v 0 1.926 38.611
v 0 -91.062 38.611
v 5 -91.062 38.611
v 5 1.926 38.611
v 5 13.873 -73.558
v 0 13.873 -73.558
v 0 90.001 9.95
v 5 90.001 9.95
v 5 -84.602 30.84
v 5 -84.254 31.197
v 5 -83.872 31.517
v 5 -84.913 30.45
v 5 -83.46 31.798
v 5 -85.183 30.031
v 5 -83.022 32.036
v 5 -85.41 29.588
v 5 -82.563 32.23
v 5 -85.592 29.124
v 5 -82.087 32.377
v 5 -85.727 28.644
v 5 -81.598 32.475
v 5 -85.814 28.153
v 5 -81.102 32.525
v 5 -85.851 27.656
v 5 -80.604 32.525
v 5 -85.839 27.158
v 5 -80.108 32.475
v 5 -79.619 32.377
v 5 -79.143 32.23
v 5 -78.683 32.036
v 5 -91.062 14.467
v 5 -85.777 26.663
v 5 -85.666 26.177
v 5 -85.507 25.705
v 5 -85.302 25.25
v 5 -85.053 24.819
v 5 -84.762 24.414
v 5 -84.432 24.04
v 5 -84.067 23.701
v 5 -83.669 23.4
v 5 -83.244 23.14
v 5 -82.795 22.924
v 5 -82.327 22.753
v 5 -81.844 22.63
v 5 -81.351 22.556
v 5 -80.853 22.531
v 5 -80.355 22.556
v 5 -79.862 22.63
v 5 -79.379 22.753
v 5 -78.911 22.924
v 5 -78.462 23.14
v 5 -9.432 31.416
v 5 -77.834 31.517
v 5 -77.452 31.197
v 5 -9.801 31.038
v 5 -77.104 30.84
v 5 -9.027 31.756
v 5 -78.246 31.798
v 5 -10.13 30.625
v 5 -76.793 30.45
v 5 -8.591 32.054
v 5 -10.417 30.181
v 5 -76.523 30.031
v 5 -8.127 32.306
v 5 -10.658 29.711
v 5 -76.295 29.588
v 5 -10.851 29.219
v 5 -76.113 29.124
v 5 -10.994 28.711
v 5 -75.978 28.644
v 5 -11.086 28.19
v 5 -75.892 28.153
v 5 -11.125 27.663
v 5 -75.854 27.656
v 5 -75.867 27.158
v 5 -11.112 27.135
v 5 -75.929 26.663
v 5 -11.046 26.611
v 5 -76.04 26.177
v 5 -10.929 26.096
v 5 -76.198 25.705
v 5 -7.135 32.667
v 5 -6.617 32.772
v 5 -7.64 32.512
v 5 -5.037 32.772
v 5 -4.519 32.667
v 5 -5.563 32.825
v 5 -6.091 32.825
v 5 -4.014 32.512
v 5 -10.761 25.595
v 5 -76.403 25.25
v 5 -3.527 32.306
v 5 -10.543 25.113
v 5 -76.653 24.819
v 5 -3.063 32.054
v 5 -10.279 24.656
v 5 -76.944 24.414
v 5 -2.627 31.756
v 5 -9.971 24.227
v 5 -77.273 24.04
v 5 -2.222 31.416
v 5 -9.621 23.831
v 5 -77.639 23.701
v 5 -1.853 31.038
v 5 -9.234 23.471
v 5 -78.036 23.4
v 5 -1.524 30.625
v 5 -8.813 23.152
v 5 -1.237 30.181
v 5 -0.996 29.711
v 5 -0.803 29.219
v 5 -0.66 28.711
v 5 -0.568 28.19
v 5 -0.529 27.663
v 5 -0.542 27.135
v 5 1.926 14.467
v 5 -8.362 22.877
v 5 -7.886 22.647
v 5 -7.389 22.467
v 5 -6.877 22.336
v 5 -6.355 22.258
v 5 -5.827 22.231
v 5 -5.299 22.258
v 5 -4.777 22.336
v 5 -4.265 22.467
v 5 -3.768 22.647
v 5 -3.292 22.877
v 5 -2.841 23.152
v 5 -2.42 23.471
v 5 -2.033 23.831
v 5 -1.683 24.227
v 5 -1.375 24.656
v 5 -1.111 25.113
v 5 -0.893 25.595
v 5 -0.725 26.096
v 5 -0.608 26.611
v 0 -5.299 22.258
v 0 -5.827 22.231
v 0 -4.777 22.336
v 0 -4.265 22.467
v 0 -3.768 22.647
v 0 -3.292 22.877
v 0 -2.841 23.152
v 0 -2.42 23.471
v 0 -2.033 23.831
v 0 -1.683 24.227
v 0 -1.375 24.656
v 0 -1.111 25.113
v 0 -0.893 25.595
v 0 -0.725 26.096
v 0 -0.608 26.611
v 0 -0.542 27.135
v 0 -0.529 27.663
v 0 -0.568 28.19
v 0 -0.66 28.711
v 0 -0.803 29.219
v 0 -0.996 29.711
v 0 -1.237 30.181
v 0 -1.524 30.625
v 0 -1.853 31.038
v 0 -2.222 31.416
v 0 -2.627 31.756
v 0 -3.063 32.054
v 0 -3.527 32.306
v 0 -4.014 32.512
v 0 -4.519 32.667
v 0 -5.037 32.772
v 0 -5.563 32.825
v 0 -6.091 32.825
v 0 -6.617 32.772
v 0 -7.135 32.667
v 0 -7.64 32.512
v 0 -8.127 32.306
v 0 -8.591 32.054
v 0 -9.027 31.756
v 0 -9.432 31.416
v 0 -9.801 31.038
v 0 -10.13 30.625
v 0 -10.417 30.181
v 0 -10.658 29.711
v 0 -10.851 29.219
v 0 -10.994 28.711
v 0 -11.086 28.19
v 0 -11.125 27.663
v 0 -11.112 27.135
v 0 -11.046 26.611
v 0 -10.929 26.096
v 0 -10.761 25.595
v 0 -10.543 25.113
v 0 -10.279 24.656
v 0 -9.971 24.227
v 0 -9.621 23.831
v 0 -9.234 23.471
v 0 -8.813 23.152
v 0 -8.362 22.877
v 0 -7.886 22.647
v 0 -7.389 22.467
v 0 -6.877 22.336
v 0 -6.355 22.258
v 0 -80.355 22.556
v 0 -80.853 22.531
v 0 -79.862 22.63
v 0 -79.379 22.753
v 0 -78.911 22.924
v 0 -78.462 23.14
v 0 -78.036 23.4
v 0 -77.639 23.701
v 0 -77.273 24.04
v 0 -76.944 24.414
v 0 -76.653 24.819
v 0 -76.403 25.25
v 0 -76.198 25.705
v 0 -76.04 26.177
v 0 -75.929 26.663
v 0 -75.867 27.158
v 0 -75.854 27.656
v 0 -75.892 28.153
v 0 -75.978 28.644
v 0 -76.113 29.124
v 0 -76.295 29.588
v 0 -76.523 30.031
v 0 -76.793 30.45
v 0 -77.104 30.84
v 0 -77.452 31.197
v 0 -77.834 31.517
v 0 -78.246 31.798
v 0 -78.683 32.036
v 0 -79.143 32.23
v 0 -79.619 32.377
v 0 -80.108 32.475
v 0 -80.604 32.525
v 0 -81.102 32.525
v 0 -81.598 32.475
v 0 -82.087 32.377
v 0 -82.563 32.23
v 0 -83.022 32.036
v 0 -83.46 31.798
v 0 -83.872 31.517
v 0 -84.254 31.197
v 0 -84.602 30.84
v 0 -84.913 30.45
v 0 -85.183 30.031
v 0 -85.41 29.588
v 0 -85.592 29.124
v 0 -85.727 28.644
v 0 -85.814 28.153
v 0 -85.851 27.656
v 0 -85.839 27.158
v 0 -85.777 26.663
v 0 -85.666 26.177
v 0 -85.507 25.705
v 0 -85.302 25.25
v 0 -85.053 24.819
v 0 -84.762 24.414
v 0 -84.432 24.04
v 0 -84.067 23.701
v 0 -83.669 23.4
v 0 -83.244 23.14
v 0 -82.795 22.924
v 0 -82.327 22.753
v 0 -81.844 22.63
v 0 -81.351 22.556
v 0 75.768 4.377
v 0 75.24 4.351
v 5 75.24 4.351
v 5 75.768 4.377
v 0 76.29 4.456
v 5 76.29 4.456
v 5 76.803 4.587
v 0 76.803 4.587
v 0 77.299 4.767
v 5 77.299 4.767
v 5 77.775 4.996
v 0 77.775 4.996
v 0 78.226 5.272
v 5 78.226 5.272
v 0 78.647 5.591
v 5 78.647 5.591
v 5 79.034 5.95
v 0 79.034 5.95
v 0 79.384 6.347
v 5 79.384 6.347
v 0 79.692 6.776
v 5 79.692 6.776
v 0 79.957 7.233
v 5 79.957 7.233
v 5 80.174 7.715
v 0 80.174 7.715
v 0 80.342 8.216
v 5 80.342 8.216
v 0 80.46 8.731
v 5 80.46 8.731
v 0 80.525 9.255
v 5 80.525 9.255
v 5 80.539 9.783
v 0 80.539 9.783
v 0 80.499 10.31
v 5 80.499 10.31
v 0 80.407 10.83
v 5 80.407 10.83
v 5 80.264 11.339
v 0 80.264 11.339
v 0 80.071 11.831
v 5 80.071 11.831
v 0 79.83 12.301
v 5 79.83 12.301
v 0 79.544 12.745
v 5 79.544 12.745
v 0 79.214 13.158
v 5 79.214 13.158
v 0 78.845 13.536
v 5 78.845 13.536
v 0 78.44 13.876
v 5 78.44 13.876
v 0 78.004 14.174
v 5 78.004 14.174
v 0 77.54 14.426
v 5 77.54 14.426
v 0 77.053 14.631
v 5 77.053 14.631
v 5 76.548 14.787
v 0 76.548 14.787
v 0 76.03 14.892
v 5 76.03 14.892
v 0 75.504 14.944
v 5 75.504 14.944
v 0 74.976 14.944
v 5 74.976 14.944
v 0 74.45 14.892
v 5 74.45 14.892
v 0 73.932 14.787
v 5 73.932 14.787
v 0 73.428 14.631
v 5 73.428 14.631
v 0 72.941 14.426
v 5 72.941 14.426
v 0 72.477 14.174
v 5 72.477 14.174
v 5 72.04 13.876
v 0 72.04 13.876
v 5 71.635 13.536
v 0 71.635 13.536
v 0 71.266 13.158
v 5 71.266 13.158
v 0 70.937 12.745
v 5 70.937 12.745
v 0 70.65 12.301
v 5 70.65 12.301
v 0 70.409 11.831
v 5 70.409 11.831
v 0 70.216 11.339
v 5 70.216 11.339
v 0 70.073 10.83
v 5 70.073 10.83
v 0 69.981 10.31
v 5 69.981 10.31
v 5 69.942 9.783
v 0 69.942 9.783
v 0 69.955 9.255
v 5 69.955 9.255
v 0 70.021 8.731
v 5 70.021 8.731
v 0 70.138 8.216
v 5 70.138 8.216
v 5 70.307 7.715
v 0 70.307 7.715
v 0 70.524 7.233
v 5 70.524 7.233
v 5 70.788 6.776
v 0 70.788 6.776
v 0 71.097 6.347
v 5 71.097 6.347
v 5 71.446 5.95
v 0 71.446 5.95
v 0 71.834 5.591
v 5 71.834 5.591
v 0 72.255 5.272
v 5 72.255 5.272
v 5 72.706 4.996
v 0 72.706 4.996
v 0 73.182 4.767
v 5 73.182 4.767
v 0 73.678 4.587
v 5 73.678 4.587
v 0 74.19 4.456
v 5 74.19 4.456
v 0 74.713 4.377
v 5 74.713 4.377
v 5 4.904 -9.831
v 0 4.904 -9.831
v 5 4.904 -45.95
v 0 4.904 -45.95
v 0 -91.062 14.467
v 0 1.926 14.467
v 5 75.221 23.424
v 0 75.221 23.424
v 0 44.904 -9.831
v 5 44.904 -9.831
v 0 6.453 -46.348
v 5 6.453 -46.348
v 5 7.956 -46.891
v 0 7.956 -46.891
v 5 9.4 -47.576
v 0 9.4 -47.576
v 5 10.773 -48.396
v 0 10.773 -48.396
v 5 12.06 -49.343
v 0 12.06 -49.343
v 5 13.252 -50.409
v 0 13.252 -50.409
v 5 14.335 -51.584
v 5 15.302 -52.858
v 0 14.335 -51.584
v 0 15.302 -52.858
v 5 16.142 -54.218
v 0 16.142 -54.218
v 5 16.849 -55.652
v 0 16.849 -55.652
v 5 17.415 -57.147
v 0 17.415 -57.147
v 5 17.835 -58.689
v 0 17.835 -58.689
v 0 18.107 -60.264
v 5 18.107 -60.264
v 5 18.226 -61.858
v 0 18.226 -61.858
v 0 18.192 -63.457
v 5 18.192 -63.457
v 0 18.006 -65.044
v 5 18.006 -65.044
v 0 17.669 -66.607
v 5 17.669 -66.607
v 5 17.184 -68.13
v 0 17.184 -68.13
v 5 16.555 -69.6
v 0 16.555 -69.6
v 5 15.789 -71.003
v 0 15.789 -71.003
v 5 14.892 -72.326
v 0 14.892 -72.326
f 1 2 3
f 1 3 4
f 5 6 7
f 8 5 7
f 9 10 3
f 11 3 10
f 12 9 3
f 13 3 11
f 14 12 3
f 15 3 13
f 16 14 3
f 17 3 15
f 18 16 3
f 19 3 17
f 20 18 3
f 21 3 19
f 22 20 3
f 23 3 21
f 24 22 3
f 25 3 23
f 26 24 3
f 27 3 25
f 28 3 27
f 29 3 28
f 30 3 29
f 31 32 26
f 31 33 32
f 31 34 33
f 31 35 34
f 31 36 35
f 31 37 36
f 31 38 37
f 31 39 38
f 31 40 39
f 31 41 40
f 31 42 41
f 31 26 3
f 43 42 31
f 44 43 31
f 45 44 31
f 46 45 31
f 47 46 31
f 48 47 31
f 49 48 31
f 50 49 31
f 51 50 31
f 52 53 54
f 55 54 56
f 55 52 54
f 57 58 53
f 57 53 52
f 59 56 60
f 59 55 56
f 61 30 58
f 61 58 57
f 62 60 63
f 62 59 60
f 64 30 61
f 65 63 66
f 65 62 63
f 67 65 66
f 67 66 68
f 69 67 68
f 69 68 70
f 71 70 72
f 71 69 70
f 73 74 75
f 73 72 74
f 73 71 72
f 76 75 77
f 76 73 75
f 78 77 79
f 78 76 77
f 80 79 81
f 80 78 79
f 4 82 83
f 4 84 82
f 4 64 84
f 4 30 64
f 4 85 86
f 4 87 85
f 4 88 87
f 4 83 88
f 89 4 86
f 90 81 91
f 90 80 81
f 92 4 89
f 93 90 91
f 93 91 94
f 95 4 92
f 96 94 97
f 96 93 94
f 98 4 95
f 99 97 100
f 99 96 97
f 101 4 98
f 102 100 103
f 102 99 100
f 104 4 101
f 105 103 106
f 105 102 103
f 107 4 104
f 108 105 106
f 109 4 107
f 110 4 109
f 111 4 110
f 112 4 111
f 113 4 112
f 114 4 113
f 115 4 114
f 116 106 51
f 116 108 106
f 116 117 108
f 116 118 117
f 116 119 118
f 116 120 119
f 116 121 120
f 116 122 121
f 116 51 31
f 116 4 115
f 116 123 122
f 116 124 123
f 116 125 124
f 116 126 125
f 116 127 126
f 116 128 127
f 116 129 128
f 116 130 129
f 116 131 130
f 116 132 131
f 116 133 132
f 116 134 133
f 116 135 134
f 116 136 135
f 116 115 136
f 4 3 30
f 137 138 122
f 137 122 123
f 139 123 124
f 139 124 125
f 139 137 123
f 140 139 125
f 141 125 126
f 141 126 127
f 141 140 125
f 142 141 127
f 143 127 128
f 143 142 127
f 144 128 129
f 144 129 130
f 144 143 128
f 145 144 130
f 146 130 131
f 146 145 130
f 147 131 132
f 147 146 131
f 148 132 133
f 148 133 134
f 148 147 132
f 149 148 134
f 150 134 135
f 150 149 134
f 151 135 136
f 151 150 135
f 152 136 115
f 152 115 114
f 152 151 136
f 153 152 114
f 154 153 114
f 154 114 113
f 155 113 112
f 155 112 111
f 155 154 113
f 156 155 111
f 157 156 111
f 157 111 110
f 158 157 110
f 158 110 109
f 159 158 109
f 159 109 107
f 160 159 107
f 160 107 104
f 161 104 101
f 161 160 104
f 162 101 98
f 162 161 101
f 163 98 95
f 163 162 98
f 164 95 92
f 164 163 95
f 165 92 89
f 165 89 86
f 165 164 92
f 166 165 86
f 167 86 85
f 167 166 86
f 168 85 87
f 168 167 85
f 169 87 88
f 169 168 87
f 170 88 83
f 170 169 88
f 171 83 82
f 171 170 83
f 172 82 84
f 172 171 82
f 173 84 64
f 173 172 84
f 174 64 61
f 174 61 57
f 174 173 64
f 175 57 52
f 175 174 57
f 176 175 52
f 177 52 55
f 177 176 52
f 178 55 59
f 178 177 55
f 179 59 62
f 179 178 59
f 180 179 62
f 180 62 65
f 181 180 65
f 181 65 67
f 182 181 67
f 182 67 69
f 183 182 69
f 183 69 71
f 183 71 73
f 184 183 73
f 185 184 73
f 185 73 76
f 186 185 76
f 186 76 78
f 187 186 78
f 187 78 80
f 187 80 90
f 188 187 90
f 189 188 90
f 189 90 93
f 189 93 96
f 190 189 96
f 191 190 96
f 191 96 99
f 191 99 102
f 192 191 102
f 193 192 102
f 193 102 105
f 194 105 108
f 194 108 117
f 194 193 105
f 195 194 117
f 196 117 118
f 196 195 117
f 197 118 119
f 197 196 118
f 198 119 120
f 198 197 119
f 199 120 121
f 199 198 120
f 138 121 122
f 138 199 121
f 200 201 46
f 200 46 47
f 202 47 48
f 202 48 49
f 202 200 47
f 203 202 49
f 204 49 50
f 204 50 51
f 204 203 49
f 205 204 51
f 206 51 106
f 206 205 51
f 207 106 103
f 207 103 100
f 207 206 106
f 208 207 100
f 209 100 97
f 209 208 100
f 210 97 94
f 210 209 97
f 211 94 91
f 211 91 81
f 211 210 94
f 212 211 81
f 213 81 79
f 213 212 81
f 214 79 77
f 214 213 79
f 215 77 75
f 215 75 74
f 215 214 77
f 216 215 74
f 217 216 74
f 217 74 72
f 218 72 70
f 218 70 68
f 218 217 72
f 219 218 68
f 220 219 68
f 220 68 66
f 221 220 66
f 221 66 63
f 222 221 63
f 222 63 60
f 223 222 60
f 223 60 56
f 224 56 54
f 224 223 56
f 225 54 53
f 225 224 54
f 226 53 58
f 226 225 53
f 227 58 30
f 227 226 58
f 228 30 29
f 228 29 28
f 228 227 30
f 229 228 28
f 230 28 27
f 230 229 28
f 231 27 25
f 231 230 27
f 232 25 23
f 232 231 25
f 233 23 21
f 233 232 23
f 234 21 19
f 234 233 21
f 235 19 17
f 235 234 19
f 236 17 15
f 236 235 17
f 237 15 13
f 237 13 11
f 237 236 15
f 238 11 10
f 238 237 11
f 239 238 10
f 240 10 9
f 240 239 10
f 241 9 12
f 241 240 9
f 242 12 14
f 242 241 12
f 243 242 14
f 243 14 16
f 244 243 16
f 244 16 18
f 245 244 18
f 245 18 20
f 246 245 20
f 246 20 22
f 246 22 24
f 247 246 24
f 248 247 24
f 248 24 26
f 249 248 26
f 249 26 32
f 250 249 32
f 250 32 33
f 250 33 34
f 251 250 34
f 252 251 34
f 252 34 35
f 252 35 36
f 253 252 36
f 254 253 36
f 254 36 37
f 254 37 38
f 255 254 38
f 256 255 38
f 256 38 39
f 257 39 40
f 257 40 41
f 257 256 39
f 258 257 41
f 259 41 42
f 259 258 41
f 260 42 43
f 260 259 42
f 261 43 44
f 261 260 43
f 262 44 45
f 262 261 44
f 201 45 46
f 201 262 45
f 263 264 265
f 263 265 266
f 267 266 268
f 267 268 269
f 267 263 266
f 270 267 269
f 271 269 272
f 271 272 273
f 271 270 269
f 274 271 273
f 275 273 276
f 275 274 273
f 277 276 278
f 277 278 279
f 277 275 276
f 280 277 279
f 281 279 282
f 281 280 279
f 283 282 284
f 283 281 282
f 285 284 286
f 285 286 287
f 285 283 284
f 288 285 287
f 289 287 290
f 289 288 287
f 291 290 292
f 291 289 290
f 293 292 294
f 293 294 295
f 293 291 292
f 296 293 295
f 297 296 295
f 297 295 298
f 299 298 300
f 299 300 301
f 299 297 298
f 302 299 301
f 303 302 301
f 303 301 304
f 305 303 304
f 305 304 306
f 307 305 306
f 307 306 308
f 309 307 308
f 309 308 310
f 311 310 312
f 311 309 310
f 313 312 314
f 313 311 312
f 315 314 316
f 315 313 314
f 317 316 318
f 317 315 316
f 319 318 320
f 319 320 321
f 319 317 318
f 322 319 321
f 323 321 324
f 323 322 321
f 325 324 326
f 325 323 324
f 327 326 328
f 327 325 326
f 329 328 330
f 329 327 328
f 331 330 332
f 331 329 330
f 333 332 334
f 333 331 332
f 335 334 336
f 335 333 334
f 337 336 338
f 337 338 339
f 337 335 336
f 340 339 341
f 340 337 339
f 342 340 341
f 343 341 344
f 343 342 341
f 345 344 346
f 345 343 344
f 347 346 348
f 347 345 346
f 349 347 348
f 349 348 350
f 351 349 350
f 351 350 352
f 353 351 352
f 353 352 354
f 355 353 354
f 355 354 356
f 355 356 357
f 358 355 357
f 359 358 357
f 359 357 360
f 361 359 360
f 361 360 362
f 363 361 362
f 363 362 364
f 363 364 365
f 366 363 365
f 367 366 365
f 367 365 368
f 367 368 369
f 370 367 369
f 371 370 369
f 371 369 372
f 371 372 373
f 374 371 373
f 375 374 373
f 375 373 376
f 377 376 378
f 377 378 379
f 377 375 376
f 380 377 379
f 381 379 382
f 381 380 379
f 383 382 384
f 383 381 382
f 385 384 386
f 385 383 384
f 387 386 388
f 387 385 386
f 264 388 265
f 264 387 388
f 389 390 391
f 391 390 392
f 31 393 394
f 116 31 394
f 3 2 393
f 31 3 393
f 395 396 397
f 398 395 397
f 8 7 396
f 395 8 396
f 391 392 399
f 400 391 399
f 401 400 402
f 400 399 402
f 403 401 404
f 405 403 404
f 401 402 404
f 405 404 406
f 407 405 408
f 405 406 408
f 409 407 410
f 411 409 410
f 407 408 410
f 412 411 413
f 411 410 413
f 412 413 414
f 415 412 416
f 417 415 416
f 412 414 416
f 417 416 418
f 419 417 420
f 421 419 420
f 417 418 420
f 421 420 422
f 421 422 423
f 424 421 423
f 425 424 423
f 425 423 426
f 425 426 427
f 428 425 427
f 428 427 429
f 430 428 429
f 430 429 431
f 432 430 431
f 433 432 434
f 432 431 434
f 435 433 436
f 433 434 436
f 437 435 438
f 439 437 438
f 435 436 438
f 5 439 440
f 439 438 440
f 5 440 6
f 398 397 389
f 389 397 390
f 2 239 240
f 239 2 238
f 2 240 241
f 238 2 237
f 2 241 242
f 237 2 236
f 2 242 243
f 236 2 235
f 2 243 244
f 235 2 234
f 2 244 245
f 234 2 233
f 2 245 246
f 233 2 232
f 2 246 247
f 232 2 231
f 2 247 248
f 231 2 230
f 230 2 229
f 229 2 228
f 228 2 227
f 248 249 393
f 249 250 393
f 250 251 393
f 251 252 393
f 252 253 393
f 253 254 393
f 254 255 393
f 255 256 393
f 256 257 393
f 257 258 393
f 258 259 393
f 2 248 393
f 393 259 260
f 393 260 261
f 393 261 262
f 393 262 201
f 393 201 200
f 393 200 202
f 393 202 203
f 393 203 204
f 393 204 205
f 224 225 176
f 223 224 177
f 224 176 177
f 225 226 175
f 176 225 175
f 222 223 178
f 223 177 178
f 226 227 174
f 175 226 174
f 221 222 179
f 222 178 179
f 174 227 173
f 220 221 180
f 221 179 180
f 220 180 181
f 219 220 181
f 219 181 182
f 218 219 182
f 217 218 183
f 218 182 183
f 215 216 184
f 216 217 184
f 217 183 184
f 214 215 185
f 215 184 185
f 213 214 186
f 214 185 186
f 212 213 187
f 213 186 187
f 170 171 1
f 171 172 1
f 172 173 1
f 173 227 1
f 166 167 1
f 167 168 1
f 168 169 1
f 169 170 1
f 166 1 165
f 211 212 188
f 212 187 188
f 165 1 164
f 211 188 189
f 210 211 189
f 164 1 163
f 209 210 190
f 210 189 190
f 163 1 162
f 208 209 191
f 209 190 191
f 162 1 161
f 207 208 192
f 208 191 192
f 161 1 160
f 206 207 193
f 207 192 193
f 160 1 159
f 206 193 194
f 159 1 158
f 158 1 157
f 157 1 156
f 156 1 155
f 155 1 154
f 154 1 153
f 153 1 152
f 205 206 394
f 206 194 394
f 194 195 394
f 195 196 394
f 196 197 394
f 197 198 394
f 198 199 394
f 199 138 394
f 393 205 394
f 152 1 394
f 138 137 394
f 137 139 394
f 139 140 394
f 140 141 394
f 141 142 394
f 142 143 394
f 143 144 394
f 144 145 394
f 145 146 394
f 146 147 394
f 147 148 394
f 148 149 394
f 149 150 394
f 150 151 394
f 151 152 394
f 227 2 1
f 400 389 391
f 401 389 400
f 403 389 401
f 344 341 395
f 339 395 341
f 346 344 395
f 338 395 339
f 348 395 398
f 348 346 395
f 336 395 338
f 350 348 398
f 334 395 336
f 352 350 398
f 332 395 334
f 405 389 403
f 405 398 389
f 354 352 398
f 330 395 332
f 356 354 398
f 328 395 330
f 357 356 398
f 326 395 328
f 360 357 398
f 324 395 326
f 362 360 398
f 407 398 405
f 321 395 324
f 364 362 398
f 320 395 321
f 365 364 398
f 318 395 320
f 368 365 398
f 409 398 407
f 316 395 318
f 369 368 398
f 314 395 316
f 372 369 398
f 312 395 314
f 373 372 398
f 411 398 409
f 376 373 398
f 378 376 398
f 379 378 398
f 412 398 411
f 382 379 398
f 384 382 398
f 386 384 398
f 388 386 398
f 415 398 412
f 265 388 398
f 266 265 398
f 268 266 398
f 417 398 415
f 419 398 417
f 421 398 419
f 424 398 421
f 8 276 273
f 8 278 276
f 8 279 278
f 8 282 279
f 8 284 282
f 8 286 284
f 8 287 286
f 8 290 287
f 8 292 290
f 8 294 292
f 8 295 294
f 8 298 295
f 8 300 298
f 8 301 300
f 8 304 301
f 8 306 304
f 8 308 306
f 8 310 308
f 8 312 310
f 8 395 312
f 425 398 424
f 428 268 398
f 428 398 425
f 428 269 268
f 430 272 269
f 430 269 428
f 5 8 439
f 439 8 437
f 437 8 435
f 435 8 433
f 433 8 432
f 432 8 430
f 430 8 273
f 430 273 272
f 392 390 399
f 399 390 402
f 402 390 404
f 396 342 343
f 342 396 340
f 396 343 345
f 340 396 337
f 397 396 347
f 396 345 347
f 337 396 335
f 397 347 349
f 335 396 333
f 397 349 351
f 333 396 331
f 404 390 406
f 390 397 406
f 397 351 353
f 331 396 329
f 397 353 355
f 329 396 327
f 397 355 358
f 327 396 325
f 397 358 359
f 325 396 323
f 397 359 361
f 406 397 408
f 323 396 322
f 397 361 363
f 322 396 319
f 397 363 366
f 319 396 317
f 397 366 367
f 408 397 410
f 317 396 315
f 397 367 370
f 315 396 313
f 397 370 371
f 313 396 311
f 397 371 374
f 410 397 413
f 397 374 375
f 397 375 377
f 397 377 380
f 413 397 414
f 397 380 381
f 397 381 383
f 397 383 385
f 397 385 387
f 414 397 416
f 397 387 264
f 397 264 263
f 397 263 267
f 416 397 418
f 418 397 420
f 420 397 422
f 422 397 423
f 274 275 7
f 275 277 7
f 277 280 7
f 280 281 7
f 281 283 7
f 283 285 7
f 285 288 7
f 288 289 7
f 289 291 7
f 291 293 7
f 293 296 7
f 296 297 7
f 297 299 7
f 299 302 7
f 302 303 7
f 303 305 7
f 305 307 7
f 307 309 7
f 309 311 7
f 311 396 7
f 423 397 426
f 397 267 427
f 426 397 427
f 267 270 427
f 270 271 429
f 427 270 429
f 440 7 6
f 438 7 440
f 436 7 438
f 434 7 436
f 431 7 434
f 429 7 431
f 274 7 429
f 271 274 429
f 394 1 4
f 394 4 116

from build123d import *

# Parameters (mm, degrees)
CROQUIS1_R                = 5.3
SALIENTE_EXTRUIR1_DEPTH   = 5
CROQUIS1_W                = 24.144167284
CROQUIS1_H                = 92.987671296
CROQUIS1_R_2              = 5
SALIENTE_EXTRUIR1_2_DEPTH = 5


with BuildPart() as part:
    # Croquis1 → Saliente-Extruir1 (new body)
    with BuildSketch(Plane(origin=(0, 0, 0), x_dir=(0, 0, -1), z_dir=(1, 0, 0))):
        with BuildLine():
            Line((73.557707563, 13.873274173), (-9.950288611, 90.000894489))
            Line((-9.950288611, 90.000894489), (-23.424203712, 75.220718175))
            Line((-23.424203712, 75.220718175), (9.831192995, 44.9044092))
            Line((9.831192995, 44.9044092), (9.831192995, 4.9044092))
            Line((9.831192995, 4.9044092), (45.950310428, 4.9044092))
            ThreePointArc((45.950310428, 4.9044092), (57.146601313, 17.414800332), (73.557707563, 13.873274173))
        make_face()
        with Locations((-9.651058952, 75.240303355)):
            Circle(CROQUIS1_R, mode=Mode.SUBTRACT)
    extrude(amount=SALIENTE_EXTRUIR1_DEPTH)


with BuildPart() as body_2:
    # Croquis1 → Saliente-Extruir1 2 (new body)
    with BuildSketch(Plane(origin=(0, 0, 0), x_dir=(0, 0, -1), z_dir=(1, 0, 0))):
        with Locations((-26.539381131, -44.567693736)):
            Rectangle(CROQUIS1_W, CROQUIS1_H)
        with Locations((-27.531274421, -5.827010277)):
            Circle(CROQUIS1_R, mode=Mode.SUBTRACT)
        with Locations((-27.531274421, -80.852812864)):
            Circle(CROQUIS1_R_2, mode=Mode.SUBTRACT)
    extrude(amount=SALIENTE_EXTRUIR1_2_DEPTH)


solid = Compound([part.part, body_2.part])
